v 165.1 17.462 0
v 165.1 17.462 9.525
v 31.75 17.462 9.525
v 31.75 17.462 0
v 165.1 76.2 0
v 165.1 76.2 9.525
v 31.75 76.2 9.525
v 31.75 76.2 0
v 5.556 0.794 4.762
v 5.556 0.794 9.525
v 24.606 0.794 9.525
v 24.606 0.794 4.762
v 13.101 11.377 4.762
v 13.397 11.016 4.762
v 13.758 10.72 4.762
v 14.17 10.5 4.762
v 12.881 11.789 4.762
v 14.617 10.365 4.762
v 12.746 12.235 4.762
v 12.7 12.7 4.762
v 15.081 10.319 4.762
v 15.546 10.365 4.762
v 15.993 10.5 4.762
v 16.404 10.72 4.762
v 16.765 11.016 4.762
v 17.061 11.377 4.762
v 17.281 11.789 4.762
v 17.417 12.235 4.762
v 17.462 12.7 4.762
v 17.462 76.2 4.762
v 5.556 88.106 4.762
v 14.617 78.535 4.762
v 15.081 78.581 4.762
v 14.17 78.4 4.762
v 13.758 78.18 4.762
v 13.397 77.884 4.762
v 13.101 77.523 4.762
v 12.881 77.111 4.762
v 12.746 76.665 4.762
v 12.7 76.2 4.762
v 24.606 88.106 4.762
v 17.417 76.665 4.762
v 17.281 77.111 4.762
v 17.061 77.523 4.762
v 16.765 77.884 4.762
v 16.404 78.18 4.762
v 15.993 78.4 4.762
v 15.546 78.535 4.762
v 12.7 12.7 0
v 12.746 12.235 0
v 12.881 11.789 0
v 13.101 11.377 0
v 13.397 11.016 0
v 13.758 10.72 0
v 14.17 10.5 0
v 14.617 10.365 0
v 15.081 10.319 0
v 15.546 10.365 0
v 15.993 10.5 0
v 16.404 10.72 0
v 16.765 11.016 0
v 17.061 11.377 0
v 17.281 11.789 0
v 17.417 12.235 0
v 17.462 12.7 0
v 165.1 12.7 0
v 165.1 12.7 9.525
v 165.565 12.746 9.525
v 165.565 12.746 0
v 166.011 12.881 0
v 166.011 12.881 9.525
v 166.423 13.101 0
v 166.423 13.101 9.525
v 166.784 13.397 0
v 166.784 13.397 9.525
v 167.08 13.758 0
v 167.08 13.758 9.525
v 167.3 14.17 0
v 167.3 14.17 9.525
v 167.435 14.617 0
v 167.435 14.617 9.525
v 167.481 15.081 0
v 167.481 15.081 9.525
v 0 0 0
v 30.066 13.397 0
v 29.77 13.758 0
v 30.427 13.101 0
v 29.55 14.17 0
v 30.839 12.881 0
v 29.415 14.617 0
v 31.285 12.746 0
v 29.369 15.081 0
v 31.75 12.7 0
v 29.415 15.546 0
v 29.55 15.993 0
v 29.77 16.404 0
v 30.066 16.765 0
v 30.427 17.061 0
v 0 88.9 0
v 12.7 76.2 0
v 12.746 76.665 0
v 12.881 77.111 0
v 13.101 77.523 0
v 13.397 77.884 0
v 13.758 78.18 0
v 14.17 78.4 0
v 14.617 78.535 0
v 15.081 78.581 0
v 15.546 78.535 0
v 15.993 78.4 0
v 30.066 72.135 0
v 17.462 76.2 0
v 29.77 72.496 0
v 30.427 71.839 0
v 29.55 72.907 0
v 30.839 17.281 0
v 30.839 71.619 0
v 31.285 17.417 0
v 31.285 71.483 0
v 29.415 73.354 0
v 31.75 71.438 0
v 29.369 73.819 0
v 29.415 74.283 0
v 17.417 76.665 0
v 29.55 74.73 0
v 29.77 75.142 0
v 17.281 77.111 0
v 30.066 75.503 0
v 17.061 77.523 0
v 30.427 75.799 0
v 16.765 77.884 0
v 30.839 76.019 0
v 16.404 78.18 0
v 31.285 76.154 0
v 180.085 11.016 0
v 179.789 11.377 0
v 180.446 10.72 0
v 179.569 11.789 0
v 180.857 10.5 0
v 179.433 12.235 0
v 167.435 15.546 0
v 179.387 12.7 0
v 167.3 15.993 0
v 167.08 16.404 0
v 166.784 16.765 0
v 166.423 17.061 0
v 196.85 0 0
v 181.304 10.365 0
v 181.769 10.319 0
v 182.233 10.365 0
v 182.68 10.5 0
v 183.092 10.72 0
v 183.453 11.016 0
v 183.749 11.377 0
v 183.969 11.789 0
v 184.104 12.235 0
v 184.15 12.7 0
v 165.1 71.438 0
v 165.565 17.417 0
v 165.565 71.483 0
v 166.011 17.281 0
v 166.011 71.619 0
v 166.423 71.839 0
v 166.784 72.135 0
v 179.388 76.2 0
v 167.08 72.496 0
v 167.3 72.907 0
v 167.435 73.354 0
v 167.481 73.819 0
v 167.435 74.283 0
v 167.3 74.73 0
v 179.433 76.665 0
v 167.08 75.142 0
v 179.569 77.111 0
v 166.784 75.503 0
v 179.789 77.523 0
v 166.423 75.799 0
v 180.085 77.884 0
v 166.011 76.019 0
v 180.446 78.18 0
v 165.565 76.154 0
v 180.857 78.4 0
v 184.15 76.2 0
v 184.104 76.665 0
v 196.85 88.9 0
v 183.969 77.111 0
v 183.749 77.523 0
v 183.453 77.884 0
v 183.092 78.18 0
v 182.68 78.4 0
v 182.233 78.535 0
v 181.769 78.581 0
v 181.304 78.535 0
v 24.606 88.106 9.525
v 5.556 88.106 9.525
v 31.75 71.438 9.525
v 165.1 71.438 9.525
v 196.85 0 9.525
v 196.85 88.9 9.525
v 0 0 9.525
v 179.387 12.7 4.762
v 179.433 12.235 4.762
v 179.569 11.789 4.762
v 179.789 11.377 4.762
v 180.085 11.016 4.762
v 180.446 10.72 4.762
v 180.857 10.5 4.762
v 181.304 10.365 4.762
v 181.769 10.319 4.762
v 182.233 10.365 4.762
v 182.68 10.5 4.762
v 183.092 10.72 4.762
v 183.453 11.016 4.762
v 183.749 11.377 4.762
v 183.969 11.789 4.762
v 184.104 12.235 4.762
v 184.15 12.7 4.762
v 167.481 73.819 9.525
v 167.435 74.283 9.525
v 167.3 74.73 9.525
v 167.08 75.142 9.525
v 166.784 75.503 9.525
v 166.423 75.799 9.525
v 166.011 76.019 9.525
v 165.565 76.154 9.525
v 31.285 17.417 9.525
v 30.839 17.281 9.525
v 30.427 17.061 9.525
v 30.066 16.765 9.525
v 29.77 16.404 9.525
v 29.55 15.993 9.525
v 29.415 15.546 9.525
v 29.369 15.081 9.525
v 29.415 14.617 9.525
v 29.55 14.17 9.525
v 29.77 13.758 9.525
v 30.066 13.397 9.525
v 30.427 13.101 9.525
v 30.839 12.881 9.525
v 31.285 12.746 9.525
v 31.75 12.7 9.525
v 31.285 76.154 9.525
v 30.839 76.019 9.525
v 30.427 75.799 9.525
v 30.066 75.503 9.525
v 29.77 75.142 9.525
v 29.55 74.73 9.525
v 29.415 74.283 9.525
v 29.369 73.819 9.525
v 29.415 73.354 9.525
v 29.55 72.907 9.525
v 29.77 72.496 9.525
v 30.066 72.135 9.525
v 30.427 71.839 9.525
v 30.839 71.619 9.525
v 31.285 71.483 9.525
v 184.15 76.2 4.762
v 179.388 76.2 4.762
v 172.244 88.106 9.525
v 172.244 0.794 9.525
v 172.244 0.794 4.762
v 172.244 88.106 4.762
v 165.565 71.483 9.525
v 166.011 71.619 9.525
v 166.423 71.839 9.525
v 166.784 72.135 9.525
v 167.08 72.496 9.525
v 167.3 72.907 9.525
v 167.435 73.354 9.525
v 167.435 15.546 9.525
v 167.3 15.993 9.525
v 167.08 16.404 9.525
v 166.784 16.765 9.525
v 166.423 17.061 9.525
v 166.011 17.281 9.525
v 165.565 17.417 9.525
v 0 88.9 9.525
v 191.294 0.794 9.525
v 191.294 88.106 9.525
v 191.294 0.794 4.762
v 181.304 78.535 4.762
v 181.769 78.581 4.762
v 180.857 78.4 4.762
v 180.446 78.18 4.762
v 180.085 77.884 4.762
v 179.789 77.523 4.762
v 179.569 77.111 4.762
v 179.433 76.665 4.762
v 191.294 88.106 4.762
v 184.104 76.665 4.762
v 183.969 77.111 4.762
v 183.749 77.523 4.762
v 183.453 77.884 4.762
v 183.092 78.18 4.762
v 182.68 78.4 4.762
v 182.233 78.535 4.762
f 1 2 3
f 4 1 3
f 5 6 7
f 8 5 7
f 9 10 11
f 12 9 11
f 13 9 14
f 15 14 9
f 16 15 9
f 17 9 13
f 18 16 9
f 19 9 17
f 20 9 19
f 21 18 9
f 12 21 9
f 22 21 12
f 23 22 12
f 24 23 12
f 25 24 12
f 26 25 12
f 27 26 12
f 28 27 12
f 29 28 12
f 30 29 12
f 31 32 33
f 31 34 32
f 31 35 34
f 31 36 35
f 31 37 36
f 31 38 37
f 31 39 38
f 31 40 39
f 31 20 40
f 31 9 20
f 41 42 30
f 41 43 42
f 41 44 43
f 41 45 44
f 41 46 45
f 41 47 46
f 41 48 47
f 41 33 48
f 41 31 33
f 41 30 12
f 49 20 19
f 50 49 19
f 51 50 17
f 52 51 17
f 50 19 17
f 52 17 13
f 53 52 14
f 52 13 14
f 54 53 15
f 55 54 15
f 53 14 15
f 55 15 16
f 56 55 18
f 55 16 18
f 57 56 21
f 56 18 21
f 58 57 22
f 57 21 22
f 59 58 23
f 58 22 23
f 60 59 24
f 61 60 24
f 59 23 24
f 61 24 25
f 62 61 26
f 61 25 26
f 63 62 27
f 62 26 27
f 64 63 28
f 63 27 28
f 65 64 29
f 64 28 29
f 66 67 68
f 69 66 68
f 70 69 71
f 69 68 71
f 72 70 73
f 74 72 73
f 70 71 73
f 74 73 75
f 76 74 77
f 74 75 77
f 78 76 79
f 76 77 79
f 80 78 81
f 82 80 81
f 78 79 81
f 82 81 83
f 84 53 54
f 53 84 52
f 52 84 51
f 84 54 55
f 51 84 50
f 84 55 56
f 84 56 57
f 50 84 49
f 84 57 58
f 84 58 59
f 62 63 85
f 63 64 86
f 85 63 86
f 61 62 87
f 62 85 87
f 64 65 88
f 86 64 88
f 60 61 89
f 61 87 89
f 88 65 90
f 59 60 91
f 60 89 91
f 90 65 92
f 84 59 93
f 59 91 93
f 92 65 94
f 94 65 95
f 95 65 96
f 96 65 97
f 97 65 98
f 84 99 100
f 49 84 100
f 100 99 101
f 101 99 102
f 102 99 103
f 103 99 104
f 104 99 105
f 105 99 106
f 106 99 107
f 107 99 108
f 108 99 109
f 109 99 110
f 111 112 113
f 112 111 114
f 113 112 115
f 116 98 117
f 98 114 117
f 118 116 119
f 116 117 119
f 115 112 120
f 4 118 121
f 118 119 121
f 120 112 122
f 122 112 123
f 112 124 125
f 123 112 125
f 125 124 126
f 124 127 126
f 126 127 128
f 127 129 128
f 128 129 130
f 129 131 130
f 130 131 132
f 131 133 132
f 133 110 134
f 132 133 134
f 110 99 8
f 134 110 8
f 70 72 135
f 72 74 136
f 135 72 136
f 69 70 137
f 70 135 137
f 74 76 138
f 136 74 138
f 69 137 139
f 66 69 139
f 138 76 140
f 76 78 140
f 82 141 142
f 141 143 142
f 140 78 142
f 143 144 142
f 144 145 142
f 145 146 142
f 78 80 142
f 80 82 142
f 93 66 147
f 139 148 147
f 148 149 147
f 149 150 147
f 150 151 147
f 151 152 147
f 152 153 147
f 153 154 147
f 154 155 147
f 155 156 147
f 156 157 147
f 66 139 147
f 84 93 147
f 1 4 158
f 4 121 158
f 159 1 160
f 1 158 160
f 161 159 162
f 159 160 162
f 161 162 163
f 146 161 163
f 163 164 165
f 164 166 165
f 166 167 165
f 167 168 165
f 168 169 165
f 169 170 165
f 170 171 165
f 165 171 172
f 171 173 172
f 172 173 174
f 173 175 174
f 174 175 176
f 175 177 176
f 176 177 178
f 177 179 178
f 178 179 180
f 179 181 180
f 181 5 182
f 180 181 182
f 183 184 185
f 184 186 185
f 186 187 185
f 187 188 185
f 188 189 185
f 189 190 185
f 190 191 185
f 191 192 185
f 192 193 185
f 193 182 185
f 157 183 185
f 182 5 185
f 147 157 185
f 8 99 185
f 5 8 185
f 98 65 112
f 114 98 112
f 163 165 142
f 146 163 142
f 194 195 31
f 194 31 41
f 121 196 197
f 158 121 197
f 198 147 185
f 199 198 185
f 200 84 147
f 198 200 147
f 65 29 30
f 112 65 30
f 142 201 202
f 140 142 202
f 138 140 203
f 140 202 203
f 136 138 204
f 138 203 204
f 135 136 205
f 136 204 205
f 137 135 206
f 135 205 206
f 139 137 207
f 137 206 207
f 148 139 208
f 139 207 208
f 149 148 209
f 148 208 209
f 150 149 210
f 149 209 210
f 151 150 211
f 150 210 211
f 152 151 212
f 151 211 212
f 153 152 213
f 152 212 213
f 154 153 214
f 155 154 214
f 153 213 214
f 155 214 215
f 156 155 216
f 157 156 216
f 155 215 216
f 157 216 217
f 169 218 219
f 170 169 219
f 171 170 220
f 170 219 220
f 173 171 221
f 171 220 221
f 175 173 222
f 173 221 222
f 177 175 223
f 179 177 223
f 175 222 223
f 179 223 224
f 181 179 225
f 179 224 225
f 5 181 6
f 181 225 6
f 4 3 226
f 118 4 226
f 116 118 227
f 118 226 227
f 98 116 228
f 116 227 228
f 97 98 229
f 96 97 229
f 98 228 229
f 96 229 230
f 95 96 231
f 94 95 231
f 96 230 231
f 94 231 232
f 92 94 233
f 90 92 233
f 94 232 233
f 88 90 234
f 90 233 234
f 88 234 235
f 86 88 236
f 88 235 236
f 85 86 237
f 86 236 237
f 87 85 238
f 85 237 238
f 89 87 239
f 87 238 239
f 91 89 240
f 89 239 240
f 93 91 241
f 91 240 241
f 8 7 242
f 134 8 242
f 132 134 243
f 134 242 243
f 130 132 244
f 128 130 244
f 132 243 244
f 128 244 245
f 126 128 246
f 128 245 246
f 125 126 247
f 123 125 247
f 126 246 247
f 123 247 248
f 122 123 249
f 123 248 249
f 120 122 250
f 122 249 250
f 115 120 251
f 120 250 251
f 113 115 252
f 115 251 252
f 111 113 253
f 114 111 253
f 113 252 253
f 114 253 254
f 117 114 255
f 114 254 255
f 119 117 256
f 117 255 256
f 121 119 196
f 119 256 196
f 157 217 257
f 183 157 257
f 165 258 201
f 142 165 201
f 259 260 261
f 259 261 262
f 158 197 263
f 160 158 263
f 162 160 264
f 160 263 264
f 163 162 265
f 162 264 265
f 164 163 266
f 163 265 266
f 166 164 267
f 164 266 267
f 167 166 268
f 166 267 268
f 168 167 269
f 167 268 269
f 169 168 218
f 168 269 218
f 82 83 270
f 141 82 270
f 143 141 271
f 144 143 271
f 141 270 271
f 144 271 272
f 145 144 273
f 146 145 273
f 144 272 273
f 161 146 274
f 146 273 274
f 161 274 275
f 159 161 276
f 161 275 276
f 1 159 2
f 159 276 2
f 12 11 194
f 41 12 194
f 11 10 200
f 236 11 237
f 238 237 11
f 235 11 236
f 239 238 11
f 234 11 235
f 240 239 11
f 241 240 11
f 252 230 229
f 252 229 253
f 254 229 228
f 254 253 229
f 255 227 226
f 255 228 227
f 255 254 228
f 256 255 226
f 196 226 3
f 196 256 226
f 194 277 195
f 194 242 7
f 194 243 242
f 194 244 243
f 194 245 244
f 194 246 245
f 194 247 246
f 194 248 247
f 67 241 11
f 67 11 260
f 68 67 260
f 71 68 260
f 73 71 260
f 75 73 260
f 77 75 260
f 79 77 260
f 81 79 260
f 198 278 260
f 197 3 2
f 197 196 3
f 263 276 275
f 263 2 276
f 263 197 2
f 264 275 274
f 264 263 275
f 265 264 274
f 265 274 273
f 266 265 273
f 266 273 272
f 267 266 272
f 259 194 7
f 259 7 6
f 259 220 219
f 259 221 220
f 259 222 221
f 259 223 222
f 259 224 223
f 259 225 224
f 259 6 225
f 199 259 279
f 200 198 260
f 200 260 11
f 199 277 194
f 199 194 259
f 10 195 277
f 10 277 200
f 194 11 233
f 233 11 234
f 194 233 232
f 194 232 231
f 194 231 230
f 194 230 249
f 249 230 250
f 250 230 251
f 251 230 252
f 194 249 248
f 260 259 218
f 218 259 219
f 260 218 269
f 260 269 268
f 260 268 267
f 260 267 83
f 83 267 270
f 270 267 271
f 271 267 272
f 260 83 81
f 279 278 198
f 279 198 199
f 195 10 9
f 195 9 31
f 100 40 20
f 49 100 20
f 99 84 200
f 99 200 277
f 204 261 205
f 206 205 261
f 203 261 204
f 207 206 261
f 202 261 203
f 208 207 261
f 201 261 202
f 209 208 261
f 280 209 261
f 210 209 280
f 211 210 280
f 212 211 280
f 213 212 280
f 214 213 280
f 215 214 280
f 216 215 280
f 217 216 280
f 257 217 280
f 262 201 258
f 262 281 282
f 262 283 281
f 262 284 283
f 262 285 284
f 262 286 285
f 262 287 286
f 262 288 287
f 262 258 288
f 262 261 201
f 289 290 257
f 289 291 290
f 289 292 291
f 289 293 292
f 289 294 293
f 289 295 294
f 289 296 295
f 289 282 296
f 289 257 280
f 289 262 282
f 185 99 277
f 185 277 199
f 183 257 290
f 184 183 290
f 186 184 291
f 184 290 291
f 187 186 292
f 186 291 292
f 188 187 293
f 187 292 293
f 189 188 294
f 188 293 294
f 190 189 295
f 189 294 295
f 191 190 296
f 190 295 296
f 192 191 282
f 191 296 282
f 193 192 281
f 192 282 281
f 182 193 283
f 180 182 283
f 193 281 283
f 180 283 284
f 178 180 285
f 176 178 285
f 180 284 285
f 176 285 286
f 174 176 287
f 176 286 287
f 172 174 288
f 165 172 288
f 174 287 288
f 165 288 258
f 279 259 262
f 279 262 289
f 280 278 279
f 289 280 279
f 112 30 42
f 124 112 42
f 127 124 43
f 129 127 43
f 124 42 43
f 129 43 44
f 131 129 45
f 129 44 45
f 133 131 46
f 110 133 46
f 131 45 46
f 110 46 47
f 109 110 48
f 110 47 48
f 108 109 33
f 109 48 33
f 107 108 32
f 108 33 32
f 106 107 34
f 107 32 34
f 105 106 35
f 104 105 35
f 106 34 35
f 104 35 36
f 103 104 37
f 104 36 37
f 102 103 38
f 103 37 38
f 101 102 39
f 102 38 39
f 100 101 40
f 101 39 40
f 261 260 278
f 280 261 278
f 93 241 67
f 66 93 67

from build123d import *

# Parameters (mm, degrees)
F0_W     = 196.85
F0_H     = 88.9
F1_DEPTH = 9.525
F3_DEPTH = 25.4
F4_W     = 19.05
F4_H     = 87.3125
F5_DEPTH = 4.7625


# Not quite as in the source:
# - a length typed as a fraction of an inch, garbled in the dataset ("3 / 203.2 mm" for 3/8 in), is restored


with BuildPart() as f1:
    # F0 (on Top) → F1 (new body)
    with BuildSketch(Plane.XY):
        with Locations((98.425, 44.45)):
            Rectangle(F0_W, F0_H)
    extrude(amount=F1_DEPTH)

    # F2 (on face) → F3 (cut)
    with BuildSketch(Plane.XY.offset(9.525)):
        with BuildLine():
            ThreePointArc((17.4625, 12.7), (15.08125, 15.08125), (12.7, 12.7))
            Line((12.7, 12.7), (17.4625, 12.7))
        make_face()
        with BuildLine():
            Line((12.7, 76.2), (12.7, 12.7))
            ThreePointArc((12.7, 12.7), (15.08125, 15.08125), (17.4625, 12.7))
            Line((17.4625, 12.7), (17.4625, 76.2))
            ThreePointArc((17.4625, 76.2), (15.08125, 73.81875), (12.7, 76.2))
        make_face()
        with BuildLine():
            Line((17.4625, 12.7), (12.7, 12.7))
            ThreePointArc((12.7, 12.7), (15.08125, 10.31875), (17.4625, 12.7))
        make_face()
        with BuildLine():
            ThreePointArc((17.4625, 76.2), (15.08125, 78.58125), (12.7, 76.2))
            Line((12.7, 76.2), (17.4625, 76.2))
        make_face()
        with BuildLine():
            Line((17.4625, 76.2), (12.7, 76.2))
            ThreePointArc((12.7, 76.2), (15.08125, 73.81875), (17.4625, 76.2))
        make_face()
        with BuildLine():
            ThreePointArc((179.3875, 12.7), (181.76875, 10.31875), (184.15, 12.7))
            Line((184.15, 12.7), (179.3875, 12.7))
        make_face()
        with BuildLine():
            ThreePointArc((179.3875, 12.7), (181.76875, 15.08125), (184.15, 12.7))
            Line((184.15, 12.7), (184.15, 76.2))
            ThreePointArc((184.15, 76.2), (181.76875, 73.81875), (179.3875, 76.2))
            Line((179.3875, 76.2), (179.3875, 12.7))
        make_face()
        with BuildLine():
            Line((179.3875, 12.7), (184.15, 12.7))
            ThreePointArc((184.15, 12.7), (181.76875, 15.08125), (179.3875, 12.7))
        make_face()
        with BuildLine():
            ThreePointArc((179.3875, 76.2), (181.76875, 73.81875), (184.15, 76.2))
            Line((184.15, 76.2), (179.3875, 76.2))
        make_face()
        with BuildLine():
            Line((179.3875, 76.2), (184.15, 76.2))
            ThreePointArc((184.15, 76.2), (181.76875, 78.58125), (179.3875, 76.2))
        make_face()
        with BuildLine():
            ThreePointArc((34.13125, 73.81875), (33.4337980227, 75.5025480227), (31.75, 76.2))
            Line((31.75, 76.2), (31.75, 71.4375))
            ThreePointArc((31.75, 71.4375), (33.4337980227, 72.1349519773), (34.13125, 73.81875))
        make_face()
        with BuildLine():
            Line((165.1, 76.2), (31.75, 76.2))
            ThreePointArc((31.75, 76.2), (33.4337980227, 75.5025480227), (34.13125, 73.81875))
            ThreePointArc((34.13125, 73.81875), (33.4337980227, 72.1349519773), (31.75, 71.4375))
            Line((31.75, 71.4375), (165.1, 71.4375))
            ThreePointArc((165.1, 71.4375), (162.71875, 73.81875), (165.1, 76.2))
        make_face()
        with BuildLine():
            Line((31.75, 71.4375), (31.75, 76.2))
            ThreePointArc((31.75, 76.2), (29.36875, 73.81875), (31.75, 71.4375))
        make_face()
        with BuildLine():
            ThreePointArc((167.48125, 73.81875), (166.7837980227, 75.5025480227), (165.1, 76.2))
            Line((165.1, 76.2), (165.1, 71.4375))
            ThreePointArc((165.1, 71.4375), (166.7837980227, 72.1349519773), (167.48125, 73.81875))
        make_face()
        with BuildLine():
            Line((165.1, 71.4375), (165.1, 76.2))
            ThreePointArc((165.1, 76.2), (162.71875, 73.81875), (165.1, 71.4375))
        make_face()
        with BuildLine():
            ThreePointArc((34.13125, 15.08125), (33.4337980227, 16.7650480227), (31.75, 17.4625))
            Line((31.75, 17.4625), (31.75, 12.7))
            ThreePointArc((31.75, 12.7), (33.4337980227, 13.3974519773), (34.13125, 15.08125))
        make_face()
        with BuildLine():
            Line((165.1, 17.4625), (31.75, 17.4625))
            ThreePointArc((31.75, 17.4625), (33.4337980227, 16.7650480227), (34.13125, 15.08125))
            ThreePointArc((34.13125, 15.08125), (33.4337980227, 13.3974519773), (31.75, 12.7))
            Line((31.75, 12.7), (165.1, 12.7))
            ThreePointArc((165.1, 12.7), (162.71875, 15.08125), (165.1, 17.4625))
        make_face()
        with BuildLine():
            Line((31.75, 12.7), (31.75, 17.4625))
            ThreePointArc((31.75, 17.4625), (29.36875, 15.08125), (31.75, 12.7))
        make_face()
        with BuildLine():
            ThreePointArc((167.48125, 15.08125), (166.7837980227, 16.7650480227), (165.1, 17.4625))
            Line((165.1, 17.4625), (165.1, 12.7))
            ThreePointArc((165.1, 12.7), (166.7837980227, 13.3974519773), (167.48125, 15.08125))
        make_face()
        with BuildLine():
            Line((165.1, 12.7), (165.1, 17.4625))
            ThreePointArc((165.1, 17.4625), (162.71875, 15.08125), (165.1, 12.7))
        make_face()
    extrude(amount=-F3_DEPTH, mode=Mode.SUBTRACT)

    # F4 (on face) → F5 (cut)
    with BuildSketch(Plane.XY.offset(9.525)):
        with Locations((15.08125, 44.45)):
            Rectangle(F4_W, F4_H)
        with Locations((181.76875, 44.45)):
            Rectangle(F4_W, F4_H)
    extrude(amount=-F5_DEPTH, mode=Mode.SUBTRACT)


solid = f1.part
